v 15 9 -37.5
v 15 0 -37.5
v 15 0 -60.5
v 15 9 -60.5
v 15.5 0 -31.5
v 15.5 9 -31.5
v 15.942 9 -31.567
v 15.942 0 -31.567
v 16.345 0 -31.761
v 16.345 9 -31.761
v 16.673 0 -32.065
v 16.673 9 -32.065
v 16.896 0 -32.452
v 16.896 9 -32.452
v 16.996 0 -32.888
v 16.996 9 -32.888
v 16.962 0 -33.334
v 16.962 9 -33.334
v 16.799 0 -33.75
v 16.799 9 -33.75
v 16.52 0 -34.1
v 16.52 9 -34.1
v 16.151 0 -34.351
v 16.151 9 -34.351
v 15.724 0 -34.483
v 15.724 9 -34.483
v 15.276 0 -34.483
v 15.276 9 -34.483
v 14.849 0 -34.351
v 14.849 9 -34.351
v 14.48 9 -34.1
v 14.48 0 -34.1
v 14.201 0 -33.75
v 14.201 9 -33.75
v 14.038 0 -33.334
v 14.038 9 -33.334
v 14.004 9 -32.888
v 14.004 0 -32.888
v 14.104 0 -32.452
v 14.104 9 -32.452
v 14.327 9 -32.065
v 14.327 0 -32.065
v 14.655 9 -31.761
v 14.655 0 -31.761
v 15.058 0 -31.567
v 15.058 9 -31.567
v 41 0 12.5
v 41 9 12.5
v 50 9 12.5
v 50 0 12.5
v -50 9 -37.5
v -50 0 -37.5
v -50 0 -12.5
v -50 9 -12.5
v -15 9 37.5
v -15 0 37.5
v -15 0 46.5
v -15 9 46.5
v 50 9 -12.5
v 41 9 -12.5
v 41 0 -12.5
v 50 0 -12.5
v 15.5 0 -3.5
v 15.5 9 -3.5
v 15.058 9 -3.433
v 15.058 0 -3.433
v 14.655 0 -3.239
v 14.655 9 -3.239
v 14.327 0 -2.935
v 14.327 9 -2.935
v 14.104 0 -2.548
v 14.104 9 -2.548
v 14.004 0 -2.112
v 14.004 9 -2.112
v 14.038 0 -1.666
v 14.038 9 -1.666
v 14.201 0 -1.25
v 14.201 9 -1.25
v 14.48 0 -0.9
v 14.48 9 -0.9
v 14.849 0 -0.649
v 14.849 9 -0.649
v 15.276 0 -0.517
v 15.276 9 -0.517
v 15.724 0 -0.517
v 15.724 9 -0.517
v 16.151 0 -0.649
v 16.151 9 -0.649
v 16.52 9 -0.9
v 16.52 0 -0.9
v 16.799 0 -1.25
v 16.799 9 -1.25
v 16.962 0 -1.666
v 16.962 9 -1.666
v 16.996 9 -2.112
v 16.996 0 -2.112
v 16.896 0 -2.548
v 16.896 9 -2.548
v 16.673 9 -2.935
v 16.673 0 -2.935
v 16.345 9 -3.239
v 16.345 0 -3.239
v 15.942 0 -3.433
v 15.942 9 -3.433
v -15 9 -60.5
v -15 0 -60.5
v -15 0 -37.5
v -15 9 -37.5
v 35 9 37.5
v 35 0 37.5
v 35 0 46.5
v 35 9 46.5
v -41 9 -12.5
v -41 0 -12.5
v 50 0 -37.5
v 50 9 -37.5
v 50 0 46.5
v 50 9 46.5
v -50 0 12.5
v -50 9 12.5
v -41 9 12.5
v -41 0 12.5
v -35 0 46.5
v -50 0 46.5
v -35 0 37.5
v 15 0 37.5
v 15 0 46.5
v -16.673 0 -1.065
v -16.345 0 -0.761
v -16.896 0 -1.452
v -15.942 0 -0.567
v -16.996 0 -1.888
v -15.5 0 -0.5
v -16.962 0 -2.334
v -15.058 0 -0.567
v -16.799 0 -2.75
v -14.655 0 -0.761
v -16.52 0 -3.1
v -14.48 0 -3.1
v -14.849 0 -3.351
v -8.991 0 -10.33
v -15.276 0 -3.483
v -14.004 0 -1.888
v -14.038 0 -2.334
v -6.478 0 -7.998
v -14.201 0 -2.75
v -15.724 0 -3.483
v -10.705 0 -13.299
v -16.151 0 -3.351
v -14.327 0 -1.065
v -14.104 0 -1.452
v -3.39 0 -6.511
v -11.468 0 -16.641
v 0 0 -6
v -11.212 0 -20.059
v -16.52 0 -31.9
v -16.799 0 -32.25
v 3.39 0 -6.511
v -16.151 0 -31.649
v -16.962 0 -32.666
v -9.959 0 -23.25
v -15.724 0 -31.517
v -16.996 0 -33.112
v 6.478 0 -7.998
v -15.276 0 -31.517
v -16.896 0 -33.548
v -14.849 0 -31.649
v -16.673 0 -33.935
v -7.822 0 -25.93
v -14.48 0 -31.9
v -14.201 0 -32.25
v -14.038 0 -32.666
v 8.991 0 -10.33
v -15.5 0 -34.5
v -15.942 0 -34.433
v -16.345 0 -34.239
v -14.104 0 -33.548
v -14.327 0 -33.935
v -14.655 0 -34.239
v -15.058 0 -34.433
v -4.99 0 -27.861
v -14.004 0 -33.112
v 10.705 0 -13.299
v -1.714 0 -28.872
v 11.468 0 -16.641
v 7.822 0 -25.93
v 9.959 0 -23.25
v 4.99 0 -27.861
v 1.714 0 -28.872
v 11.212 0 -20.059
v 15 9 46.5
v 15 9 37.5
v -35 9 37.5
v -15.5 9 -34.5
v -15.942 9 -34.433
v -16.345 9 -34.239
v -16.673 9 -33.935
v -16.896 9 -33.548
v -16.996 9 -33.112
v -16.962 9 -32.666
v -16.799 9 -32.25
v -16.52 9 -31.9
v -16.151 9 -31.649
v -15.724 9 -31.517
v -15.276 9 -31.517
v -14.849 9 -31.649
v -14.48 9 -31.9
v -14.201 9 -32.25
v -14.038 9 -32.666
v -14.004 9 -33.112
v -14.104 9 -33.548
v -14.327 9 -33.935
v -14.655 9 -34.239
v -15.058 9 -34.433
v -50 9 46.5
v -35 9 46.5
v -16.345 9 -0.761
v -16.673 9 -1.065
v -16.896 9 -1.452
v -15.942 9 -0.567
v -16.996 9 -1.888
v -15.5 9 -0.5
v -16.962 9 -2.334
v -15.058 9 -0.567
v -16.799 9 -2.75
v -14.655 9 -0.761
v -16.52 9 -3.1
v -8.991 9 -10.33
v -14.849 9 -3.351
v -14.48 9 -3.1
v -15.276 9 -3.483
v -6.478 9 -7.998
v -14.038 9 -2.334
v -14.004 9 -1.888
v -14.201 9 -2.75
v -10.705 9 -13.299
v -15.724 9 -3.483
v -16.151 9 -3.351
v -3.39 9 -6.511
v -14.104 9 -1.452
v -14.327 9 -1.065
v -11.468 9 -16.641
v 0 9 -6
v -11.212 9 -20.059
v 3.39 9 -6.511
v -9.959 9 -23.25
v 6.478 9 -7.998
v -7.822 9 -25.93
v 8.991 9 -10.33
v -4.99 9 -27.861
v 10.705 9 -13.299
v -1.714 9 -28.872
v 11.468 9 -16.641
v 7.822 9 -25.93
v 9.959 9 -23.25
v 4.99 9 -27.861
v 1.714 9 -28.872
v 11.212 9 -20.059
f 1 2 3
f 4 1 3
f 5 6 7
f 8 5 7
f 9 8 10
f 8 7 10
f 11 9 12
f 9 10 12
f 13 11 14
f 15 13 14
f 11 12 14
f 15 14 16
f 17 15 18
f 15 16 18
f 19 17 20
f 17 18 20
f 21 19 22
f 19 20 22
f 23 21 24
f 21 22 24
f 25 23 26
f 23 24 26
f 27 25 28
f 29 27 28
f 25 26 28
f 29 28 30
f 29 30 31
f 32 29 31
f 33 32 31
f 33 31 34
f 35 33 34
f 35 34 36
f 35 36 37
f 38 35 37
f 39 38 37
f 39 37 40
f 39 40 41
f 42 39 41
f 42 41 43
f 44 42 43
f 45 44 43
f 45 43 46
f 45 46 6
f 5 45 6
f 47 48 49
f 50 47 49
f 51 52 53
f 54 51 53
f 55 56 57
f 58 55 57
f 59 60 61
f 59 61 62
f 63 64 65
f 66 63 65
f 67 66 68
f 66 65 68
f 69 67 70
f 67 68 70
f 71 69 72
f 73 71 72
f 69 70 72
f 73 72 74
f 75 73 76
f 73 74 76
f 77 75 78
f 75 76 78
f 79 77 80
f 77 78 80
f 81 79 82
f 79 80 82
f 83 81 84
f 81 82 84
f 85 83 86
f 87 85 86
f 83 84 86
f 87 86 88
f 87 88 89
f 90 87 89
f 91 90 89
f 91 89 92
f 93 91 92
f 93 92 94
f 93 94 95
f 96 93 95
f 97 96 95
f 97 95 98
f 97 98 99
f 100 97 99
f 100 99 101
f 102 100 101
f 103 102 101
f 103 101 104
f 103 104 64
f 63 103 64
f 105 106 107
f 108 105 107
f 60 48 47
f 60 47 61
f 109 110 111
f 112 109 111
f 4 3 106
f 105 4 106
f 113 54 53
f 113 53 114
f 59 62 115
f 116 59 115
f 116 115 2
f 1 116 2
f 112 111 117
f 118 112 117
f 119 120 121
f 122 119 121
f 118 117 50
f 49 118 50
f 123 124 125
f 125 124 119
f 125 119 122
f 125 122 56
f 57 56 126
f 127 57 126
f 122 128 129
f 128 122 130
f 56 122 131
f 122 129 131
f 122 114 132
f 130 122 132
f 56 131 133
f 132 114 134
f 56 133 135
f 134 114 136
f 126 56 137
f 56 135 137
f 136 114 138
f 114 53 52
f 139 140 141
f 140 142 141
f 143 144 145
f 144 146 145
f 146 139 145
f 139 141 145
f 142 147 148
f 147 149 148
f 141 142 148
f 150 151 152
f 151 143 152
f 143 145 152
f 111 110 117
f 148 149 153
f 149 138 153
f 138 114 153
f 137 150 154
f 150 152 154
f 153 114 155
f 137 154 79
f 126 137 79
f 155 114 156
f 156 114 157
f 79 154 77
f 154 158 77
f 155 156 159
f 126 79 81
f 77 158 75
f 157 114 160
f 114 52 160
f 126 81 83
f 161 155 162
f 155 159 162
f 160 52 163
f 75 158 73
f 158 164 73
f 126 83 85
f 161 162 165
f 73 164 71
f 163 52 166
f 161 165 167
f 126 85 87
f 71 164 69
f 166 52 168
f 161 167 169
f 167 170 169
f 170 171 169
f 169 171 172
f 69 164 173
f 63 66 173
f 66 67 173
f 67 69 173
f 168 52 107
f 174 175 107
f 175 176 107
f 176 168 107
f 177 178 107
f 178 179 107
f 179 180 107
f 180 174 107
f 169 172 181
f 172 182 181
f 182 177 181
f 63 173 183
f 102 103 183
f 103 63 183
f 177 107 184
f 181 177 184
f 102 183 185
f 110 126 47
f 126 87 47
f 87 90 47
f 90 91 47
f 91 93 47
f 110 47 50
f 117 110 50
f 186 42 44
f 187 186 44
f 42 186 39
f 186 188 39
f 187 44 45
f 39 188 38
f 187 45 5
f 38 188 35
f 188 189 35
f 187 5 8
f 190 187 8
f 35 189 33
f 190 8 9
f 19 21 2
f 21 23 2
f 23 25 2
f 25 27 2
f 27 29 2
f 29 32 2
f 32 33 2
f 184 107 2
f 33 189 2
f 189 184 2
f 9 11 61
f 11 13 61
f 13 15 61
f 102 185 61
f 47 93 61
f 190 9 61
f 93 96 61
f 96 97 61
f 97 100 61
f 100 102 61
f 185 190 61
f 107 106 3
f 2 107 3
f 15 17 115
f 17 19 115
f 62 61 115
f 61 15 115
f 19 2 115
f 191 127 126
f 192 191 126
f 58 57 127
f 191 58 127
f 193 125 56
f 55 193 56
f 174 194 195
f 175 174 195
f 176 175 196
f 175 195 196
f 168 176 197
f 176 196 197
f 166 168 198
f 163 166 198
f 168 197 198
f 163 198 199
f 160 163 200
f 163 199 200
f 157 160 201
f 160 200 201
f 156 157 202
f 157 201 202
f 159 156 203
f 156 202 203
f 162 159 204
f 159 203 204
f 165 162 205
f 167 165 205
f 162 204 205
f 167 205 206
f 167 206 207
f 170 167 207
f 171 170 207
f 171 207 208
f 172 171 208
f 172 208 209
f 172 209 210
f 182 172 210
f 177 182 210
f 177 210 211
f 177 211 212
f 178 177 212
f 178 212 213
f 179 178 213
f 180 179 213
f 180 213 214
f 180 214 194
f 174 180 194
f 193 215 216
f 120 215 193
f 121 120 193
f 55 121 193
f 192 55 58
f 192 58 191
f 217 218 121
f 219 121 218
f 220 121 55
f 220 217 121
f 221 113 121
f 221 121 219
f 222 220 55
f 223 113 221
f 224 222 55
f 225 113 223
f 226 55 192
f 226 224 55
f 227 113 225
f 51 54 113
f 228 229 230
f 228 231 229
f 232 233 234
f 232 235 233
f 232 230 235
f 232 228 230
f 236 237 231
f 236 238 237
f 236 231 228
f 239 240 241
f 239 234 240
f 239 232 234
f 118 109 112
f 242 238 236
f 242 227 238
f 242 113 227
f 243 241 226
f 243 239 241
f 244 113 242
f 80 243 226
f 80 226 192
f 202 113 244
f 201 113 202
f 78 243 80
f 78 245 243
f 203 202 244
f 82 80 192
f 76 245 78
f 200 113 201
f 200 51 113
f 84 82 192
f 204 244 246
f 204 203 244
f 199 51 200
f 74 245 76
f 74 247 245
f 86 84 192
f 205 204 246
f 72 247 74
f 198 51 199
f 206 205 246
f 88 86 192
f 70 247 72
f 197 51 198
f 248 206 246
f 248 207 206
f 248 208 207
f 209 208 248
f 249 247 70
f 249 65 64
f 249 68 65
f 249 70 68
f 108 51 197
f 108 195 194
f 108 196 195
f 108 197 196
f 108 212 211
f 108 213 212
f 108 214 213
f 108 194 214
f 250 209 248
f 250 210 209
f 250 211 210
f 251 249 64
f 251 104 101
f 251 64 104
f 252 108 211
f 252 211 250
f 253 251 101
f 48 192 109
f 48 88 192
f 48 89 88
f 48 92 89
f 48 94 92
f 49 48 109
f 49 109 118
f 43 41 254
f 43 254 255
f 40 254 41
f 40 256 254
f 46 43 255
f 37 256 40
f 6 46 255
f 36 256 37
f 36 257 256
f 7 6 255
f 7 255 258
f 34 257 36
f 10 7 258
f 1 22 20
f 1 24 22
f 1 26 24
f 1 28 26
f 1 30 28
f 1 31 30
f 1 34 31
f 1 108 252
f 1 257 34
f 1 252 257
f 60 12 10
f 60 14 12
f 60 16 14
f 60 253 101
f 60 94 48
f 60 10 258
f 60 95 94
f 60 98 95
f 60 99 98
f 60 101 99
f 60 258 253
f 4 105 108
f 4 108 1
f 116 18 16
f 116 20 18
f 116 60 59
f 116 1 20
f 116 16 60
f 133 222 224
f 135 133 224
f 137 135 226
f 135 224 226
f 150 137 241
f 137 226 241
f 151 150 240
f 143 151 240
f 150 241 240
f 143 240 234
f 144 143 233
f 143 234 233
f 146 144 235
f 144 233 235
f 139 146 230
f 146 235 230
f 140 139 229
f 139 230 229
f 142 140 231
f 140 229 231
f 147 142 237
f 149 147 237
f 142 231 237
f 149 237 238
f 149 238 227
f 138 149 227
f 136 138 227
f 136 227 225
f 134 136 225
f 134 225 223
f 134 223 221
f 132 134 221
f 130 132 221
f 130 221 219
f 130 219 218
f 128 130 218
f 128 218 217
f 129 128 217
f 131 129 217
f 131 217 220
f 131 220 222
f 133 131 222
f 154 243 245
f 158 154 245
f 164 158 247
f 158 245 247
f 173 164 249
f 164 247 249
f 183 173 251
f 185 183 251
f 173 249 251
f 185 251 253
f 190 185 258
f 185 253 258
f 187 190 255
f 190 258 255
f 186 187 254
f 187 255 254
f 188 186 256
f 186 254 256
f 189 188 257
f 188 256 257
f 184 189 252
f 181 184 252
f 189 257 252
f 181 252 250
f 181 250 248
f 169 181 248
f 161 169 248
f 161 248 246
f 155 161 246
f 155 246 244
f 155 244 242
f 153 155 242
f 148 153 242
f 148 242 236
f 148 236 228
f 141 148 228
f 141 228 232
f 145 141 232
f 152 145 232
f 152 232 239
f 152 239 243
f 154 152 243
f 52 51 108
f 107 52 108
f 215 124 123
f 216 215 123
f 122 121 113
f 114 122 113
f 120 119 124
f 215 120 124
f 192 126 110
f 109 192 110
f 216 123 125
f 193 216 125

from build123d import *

# Parameters (mm, degrees)
BOSS_EXTRUDE1_DEPTH = 9
SKETCH4_R           = 11.5
SKETCH4_R_2         = 1.5
CUT_EXTRUDE1_DEPTH  = 80.001582263
SKETCH5_W           = 9
SKETCH5_H           = 25
CUT_EXTRUDE2_DEPTH  = 80.001582263
SKETCH6_W           = 15
SKETCH6_H           = 9
CUT_EXTRUDE3_DEPTH  = 80.001582263


with BuildPart() as part:
    # Sketch2 → Boss-Extrude1 (new body)
    with BuildSketch(Plane(origin=(0, 0, 0), x_dir=(1, 0, 0), z_dir=(0, 1, 0))):
        Polygon((-50, 46.5), (-50, -46.5), (-35, -46.5), (-35, -37.5), (-15, -37.5), (-15, -46.5), (15, -46.5), (15, -37.5), (35, -37.5), (35, -46.5), (50, -46.5), (50, 46.5), (35, 46.5), (35, 37.5), (15, 37.5), (15, 60.5), (-15, 60.5), (-15, 37.5), (-35, 37.5), (-35, 46.5), align=None)
    extrude(amount=BOSS_EXTRUDE1_DEPTH)

    # Sketch4 → Cut-Extrude1 (cut, through all)
    with BuildSketch(Plane(origin=(0, 9, 0), x_dir=(1, 0, 0), z_dir=(0, 1, 0))):
        with Locations(Location((0, 17.5, 0), (0, 0, 270))):
            Circle(SKETCH4_R)
        with Locations(Location((-15.5, 2, 0), (0, 0, 270))):
            Circle(SKETCH4_R_2)
        with Locations(Location((15.5, 2, 0), (0, 0, 90))):
            Circle(SKETCH4_R_2)
        with Locations(Location((15.5, 33, 0), (0, 0, 270))):
            Circle(SKETCH4_R_2)
        with Locations(Location((-15.5, 33, 0), (0, 0, 90))):
            Circle(SKETCH4_R_2)
    extrude(amount=-CUT_EXTRUDE1_DEPTH, mode=Mode.SUBTRACT)

    # Sketch5 → Cut-Extrude2 (cut, through all)
    with BuildSketch(Plane(origin=(0, 9, 0), x_dir=(1, 0, 0), z_dir=(0, 1, 0))):
        with Locations((-45.5, 0)):
            Rectangle(SKETCH5_W, SKETCH5_H)
        with Locations((45.5, 0)):
            Rectangle(SKETCH5_W, SKETCH5_H)
    extrude(amount=-CUT_EXTRUDE2_DEPTH, mode=Mode.SUBTRACT)

    # Sketch6 → Cut-Extrude3 (cut, through all)
    with BuildSketch(Plane(origin=(0, 9, 0), x_dir=(1, 0, 0), z_dir=(0, 1, 0))):
        with Locations((-42.5, 42)):
            Rectangle(SKETCH6_W, SKETCH6_H)
        with Locations((42.5, 42)):
            Rectangle(SKETCH6_W, SKETCH6_H)
    extrude(amount=-CUT_EXTRUDE3_DEPTH, mode=Mode.SUBTRACT)


solid = part.part
